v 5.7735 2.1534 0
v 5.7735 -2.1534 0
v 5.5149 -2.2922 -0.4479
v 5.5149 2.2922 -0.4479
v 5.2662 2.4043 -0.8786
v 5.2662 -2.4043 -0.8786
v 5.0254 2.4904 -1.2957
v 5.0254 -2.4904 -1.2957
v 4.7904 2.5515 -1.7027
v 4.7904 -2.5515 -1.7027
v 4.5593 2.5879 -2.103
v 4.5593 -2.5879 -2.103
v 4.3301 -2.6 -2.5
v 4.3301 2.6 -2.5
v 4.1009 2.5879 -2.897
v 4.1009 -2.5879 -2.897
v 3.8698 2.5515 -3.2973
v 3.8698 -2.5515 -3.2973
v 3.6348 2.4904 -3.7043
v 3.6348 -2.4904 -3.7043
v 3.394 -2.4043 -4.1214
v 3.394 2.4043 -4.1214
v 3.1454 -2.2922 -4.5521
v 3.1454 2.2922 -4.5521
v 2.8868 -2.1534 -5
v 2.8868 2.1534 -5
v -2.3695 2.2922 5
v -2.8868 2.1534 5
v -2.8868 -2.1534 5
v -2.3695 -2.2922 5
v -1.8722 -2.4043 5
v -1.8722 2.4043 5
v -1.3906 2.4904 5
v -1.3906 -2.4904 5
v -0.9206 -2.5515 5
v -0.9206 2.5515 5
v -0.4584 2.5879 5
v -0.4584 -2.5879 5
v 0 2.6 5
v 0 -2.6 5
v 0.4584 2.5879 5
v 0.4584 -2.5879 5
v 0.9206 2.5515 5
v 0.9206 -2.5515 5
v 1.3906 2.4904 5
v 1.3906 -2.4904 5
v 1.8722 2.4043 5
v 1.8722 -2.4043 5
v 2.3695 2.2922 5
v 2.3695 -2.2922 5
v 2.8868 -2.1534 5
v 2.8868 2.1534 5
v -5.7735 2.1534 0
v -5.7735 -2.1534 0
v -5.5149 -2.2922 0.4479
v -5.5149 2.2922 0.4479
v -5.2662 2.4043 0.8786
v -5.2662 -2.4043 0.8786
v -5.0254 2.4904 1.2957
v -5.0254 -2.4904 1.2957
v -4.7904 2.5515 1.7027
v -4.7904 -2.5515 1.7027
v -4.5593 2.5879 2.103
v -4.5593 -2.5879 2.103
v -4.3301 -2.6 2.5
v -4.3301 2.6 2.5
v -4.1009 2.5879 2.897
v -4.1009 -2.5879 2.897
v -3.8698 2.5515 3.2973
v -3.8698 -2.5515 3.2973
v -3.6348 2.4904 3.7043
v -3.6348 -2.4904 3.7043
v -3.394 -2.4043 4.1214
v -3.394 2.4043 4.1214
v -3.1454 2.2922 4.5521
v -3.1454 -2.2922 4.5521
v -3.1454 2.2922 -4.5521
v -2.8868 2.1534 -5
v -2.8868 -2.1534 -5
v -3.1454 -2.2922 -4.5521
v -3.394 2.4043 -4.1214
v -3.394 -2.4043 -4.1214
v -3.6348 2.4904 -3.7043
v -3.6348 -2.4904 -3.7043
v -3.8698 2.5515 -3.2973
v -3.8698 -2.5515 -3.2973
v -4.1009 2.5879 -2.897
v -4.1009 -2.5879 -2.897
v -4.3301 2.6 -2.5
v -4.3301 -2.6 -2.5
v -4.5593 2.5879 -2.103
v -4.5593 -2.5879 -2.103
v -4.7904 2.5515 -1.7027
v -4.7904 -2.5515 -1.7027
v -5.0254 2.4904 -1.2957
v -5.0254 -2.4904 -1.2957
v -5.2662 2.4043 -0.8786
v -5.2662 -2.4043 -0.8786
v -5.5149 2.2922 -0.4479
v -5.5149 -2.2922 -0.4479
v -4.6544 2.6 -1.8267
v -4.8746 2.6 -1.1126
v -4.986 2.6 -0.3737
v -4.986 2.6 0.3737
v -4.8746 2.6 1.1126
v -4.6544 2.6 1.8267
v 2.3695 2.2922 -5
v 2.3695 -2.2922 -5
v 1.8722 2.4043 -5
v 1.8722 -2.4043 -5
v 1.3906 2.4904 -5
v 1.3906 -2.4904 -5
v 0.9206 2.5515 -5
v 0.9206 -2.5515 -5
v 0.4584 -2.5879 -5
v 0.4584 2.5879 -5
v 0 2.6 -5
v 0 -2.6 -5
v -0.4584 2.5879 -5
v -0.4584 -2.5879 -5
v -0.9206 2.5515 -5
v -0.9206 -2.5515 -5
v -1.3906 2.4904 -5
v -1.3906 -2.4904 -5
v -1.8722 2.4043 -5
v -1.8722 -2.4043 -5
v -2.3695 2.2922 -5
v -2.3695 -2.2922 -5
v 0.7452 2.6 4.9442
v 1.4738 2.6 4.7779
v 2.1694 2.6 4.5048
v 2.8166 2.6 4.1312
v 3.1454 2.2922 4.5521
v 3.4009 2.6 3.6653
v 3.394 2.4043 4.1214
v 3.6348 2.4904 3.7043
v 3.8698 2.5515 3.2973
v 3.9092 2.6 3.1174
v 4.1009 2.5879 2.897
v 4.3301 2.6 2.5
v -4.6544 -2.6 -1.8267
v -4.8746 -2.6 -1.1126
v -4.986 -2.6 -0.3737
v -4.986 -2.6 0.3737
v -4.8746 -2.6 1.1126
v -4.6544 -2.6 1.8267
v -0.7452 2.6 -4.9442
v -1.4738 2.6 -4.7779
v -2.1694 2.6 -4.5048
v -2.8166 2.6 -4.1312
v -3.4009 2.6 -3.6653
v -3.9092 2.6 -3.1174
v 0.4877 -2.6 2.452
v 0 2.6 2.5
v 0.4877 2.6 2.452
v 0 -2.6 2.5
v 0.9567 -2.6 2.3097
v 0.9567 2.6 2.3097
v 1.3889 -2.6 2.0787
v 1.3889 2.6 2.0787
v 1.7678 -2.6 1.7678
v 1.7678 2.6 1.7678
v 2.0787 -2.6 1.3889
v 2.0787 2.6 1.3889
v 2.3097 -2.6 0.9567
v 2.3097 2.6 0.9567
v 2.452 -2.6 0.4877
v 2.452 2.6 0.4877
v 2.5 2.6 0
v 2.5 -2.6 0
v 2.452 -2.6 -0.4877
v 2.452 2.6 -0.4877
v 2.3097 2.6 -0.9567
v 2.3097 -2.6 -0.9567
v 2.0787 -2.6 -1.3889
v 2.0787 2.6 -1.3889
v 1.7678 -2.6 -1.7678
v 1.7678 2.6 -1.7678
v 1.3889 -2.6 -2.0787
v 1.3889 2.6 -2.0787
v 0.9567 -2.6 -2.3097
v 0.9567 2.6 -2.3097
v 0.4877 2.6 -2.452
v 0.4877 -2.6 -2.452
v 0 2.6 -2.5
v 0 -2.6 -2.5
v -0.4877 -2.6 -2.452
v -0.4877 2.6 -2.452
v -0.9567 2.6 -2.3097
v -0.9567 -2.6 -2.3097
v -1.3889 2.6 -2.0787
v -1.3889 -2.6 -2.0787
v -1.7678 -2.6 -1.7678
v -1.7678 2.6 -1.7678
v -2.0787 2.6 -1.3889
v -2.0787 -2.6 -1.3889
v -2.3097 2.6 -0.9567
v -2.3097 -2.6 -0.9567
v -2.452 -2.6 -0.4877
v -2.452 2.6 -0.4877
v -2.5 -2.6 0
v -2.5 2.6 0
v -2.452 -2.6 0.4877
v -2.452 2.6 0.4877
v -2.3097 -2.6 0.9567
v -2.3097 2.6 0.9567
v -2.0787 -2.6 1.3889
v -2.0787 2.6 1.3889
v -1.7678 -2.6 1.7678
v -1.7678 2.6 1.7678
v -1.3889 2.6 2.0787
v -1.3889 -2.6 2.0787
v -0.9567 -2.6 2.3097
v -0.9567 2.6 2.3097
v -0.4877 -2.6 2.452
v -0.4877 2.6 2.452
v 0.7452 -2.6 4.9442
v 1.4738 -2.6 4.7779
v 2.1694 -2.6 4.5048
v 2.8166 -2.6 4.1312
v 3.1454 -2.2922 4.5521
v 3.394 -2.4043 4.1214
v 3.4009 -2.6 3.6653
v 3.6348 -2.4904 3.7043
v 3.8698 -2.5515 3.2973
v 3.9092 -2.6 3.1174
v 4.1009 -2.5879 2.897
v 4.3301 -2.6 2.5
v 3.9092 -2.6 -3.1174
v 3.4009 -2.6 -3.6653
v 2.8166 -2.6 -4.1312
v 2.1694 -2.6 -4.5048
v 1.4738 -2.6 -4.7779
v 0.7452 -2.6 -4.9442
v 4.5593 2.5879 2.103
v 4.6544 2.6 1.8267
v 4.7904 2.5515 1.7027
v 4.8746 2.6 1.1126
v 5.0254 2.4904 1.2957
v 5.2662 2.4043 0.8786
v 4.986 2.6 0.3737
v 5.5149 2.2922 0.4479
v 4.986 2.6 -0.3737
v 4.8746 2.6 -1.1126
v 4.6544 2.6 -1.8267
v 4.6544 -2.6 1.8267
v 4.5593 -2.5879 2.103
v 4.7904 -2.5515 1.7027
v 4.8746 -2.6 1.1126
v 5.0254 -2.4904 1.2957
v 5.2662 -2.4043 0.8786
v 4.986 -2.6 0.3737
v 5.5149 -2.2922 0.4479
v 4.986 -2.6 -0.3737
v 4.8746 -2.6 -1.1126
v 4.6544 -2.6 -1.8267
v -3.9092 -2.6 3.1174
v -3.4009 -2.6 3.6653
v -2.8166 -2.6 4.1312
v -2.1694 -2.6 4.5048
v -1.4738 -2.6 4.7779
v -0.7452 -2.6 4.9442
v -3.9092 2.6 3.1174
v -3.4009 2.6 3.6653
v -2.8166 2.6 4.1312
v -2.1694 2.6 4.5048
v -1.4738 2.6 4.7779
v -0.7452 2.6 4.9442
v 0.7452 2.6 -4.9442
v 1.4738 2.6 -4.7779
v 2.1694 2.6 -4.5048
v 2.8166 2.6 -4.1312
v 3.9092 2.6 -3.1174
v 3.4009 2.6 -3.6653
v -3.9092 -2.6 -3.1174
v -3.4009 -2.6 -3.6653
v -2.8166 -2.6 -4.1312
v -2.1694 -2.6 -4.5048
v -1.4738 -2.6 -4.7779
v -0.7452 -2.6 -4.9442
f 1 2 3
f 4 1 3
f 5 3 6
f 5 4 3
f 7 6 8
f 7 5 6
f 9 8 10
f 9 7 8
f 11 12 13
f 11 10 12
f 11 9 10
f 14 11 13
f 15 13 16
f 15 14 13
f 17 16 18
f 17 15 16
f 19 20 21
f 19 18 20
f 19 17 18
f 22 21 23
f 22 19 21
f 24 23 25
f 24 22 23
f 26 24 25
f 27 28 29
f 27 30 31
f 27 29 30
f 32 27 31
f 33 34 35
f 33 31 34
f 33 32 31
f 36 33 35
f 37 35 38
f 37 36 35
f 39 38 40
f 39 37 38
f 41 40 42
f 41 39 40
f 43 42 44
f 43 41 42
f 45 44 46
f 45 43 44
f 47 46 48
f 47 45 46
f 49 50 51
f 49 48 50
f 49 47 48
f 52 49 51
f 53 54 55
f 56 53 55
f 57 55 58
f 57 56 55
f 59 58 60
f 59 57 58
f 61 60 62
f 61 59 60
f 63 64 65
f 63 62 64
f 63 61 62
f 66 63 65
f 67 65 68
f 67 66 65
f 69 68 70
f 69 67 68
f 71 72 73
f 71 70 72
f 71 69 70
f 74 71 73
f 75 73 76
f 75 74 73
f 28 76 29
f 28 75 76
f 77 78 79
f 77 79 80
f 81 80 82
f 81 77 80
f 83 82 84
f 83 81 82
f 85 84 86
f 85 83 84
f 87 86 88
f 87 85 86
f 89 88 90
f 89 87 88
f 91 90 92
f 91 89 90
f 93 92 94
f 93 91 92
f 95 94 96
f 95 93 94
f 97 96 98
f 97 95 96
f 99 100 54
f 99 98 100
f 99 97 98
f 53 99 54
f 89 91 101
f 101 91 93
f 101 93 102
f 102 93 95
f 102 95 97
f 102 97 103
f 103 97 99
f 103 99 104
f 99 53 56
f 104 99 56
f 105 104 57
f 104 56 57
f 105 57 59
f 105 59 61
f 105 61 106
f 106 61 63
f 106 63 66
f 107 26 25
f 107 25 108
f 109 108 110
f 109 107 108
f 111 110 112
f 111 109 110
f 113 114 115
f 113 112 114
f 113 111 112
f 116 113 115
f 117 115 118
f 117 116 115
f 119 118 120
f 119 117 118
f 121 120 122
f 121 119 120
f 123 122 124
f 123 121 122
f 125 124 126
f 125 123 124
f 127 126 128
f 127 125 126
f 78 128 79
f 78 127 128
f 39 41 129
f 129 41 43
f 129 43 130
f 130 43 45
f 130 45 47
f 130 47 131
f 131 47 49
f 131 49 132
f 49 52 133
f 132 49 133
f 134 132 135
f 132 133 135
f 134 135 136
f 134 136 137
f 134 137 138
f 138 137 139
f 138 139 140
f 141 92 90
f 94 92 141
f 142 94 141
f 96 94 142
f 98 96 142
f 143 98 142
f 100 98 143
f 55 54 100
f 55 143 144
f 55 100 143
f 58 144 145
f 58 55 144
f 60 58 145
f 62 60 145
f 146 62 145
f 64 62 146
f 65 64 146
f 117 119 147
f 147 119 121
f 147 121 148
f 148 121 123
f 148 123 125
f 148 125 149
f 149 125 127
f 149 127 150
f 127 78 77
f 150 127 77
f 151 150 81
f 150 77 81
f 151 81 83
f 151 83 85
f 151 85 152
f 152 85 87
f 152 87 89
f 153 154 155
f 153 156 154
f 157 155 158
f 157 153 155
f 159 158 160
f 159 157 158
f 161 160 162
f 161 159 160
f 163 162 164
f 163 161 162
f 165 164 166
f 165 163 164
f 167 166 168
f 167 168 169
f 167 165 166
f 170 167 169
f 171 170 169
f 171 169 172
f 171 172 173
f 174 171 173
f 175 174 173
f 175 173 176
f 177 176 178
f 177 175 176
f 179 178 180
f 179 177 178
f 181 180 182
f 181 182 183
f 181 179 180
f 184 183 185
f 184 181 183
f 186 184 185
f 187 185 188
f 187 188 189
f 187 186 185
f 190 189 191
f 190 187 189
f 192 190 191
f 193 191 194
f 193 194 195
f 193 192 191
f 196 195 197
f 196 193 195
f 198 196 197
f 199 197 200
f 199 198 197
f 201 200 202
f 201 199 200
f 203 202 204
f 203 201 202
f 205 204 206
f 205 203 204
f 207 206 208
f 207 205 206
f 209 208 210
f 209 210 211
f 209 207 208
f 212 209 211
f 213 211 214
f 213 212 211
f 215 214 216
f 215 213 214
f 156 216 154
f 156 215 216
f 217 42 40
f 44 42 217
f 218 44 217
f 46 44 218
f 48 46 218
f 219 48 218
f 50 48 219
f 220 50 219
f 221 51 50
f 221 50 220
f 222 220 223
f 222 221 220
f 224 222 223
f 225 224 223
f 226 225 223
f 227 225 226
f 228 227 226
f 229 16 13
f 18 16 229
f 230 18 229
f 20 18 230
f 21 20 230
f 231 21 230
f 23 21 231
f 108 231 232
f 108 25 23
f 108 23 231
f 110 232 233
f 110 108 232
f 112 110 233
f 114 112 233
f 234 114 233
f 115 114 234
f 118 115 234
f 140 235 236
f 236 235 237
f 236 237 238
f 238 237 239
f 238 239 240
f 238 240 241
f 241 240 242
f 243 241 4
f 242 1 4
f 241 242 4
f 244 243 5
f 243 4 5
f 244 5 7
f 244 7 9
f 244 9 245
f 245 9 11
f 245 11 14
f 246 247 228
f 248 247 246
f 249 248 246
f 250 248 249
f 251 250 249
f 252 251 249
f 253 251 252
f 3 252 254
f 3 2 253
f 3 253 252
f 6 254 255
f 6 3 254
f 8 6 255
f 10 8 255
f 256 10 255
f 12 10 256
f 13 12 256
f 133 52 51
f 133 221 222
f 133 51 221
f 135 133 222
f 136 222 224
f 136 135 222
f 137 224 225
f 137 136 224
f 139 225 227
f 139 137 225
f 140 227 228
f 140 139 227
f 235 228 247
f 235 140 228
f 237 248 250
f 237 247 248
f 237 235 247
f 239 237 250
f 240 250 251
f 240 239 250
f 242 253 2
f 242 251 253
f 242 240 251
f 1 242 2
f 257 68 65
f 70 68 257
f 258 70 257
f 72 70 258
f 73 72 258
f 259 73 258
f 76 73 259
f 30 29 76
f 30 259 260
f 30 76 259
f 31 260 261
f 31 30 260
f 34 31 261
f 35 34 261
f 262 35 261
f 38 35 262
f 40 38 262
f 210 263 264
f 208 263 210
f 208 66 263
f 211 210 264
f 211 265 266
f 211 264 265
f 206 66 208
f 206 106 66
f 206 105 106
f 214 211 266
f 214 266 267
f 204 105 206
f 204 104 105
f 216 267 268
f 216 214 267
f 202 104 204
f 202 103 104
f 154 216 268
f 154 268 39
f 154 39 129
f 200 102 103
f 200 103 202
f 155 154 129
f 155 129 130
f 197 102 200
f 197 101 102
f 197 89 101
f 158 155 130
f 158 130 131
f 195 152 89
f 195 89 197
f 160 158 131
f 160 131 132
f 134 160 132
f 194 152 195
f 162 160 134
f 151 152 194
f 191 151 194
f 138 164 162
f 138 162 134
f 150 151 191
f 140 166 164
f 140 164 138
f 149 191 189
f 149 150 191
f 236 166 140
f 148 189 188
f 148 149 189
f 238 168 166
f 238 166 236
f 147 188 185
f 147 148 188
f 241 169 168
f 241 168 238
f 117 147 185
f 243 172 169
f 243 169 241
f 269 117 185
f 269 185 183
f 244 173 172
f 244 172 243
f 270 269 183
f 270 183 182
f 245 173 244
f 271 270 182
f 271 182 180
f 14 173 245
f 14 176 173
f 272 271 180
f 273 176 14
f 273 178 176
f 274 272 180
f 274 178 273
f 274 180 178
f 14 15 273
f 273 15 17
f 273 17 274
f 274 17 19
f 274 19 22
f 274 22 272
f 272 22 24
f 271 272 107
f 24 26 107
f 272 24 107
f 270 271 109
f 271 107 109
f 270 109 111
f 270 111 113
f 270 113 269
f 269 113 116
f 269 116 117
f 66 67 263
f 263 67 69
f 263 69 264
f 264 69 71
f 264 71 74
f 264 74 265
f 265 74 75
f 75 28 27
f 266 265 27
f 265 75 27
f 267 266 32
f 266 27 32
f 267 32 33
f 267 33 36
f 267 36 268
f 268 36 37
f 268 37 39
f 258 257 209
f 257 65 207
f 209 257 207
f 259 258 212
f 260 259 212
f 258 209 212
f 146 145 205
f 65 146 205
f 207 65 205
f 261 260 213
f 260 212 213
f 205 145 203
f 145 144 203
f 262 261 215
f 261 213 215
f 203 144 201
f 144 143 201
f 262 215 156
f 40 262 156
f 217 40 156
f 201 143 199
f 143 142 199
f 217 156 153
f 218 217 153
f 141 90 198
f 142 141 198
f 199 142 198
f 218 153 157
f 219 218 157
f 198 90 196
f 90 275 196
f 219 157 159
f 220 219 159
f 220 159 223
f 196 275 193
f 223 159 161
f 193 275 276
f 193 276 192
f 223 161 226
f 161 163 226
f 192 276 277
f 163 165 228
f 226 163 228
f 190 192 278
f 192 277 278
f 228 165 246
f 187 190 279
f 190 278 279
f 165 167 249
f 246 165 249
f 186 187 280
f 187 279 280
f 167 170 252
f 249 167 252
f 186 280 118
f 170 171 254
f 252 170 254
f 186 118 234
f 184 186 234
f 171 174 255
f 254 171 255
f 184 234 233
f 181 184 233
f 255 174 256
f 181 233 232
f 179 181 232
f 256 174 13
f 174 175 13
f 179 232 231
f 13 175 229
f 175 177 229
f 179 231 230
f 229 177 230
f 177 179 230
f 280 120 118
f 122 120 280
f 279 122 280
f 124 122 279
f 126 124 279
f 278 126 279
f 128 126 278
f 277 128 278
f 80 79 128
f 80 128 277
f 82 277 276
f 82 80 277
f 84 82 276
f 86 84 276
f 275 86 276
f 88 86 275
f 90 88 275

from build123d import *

# Parameters (mm, degrees)
SKETCH1_R           = 2.5
BOSS_EXTRUDE1_DEPTH = 2.6


with BuildPart() as part:
    # Sketch1 → Boss-Extrude1 (new, symmetric)
    with BuildSketch(Plane(origin=(0, 0, 0), x_dir=(1, 0, 0), z_dir=(0, 1, 0))):
        Polygon((5.773502692, 0), (2.886751346, 5), (-2.886751346, 5), (-5.773502692, 0), (-2.886751346, -5), (2.886751346, -5), align=None)
        with Locations(Location((0, 0, 0), (0, 0, 270))):
            Circle(SKETCH1_R, mode=Mode.SUBTRACT)
    extrude(amount=BOSS_EXTRUDE1_DEPTH, both=True)

    # Sketch3 → Cut-Revolve2 (revolve, cut)
    with BuildSketch(Plane(origin=(0, 0, 0), x_dir=(0, 0, -1), z_dir=(1, 0, 0))):
        Polygon((4.133974596, 3.1), (5.866025404, 2.1), (6.366025404, 2.966025404), (4.633974596, 3.966025404), align=None)
    cut_revolve2 = revolve(axis=Axis((0, -2.6, 0), (0, 1, 0)), mode=Mode.SUBTRACT)

    # Mirror1: Cut-Revolve2 across plane
    add(cut_revolve2.mirror(Plane.ZX), mode=Mode.SUBTRACT)


solid = part.part
